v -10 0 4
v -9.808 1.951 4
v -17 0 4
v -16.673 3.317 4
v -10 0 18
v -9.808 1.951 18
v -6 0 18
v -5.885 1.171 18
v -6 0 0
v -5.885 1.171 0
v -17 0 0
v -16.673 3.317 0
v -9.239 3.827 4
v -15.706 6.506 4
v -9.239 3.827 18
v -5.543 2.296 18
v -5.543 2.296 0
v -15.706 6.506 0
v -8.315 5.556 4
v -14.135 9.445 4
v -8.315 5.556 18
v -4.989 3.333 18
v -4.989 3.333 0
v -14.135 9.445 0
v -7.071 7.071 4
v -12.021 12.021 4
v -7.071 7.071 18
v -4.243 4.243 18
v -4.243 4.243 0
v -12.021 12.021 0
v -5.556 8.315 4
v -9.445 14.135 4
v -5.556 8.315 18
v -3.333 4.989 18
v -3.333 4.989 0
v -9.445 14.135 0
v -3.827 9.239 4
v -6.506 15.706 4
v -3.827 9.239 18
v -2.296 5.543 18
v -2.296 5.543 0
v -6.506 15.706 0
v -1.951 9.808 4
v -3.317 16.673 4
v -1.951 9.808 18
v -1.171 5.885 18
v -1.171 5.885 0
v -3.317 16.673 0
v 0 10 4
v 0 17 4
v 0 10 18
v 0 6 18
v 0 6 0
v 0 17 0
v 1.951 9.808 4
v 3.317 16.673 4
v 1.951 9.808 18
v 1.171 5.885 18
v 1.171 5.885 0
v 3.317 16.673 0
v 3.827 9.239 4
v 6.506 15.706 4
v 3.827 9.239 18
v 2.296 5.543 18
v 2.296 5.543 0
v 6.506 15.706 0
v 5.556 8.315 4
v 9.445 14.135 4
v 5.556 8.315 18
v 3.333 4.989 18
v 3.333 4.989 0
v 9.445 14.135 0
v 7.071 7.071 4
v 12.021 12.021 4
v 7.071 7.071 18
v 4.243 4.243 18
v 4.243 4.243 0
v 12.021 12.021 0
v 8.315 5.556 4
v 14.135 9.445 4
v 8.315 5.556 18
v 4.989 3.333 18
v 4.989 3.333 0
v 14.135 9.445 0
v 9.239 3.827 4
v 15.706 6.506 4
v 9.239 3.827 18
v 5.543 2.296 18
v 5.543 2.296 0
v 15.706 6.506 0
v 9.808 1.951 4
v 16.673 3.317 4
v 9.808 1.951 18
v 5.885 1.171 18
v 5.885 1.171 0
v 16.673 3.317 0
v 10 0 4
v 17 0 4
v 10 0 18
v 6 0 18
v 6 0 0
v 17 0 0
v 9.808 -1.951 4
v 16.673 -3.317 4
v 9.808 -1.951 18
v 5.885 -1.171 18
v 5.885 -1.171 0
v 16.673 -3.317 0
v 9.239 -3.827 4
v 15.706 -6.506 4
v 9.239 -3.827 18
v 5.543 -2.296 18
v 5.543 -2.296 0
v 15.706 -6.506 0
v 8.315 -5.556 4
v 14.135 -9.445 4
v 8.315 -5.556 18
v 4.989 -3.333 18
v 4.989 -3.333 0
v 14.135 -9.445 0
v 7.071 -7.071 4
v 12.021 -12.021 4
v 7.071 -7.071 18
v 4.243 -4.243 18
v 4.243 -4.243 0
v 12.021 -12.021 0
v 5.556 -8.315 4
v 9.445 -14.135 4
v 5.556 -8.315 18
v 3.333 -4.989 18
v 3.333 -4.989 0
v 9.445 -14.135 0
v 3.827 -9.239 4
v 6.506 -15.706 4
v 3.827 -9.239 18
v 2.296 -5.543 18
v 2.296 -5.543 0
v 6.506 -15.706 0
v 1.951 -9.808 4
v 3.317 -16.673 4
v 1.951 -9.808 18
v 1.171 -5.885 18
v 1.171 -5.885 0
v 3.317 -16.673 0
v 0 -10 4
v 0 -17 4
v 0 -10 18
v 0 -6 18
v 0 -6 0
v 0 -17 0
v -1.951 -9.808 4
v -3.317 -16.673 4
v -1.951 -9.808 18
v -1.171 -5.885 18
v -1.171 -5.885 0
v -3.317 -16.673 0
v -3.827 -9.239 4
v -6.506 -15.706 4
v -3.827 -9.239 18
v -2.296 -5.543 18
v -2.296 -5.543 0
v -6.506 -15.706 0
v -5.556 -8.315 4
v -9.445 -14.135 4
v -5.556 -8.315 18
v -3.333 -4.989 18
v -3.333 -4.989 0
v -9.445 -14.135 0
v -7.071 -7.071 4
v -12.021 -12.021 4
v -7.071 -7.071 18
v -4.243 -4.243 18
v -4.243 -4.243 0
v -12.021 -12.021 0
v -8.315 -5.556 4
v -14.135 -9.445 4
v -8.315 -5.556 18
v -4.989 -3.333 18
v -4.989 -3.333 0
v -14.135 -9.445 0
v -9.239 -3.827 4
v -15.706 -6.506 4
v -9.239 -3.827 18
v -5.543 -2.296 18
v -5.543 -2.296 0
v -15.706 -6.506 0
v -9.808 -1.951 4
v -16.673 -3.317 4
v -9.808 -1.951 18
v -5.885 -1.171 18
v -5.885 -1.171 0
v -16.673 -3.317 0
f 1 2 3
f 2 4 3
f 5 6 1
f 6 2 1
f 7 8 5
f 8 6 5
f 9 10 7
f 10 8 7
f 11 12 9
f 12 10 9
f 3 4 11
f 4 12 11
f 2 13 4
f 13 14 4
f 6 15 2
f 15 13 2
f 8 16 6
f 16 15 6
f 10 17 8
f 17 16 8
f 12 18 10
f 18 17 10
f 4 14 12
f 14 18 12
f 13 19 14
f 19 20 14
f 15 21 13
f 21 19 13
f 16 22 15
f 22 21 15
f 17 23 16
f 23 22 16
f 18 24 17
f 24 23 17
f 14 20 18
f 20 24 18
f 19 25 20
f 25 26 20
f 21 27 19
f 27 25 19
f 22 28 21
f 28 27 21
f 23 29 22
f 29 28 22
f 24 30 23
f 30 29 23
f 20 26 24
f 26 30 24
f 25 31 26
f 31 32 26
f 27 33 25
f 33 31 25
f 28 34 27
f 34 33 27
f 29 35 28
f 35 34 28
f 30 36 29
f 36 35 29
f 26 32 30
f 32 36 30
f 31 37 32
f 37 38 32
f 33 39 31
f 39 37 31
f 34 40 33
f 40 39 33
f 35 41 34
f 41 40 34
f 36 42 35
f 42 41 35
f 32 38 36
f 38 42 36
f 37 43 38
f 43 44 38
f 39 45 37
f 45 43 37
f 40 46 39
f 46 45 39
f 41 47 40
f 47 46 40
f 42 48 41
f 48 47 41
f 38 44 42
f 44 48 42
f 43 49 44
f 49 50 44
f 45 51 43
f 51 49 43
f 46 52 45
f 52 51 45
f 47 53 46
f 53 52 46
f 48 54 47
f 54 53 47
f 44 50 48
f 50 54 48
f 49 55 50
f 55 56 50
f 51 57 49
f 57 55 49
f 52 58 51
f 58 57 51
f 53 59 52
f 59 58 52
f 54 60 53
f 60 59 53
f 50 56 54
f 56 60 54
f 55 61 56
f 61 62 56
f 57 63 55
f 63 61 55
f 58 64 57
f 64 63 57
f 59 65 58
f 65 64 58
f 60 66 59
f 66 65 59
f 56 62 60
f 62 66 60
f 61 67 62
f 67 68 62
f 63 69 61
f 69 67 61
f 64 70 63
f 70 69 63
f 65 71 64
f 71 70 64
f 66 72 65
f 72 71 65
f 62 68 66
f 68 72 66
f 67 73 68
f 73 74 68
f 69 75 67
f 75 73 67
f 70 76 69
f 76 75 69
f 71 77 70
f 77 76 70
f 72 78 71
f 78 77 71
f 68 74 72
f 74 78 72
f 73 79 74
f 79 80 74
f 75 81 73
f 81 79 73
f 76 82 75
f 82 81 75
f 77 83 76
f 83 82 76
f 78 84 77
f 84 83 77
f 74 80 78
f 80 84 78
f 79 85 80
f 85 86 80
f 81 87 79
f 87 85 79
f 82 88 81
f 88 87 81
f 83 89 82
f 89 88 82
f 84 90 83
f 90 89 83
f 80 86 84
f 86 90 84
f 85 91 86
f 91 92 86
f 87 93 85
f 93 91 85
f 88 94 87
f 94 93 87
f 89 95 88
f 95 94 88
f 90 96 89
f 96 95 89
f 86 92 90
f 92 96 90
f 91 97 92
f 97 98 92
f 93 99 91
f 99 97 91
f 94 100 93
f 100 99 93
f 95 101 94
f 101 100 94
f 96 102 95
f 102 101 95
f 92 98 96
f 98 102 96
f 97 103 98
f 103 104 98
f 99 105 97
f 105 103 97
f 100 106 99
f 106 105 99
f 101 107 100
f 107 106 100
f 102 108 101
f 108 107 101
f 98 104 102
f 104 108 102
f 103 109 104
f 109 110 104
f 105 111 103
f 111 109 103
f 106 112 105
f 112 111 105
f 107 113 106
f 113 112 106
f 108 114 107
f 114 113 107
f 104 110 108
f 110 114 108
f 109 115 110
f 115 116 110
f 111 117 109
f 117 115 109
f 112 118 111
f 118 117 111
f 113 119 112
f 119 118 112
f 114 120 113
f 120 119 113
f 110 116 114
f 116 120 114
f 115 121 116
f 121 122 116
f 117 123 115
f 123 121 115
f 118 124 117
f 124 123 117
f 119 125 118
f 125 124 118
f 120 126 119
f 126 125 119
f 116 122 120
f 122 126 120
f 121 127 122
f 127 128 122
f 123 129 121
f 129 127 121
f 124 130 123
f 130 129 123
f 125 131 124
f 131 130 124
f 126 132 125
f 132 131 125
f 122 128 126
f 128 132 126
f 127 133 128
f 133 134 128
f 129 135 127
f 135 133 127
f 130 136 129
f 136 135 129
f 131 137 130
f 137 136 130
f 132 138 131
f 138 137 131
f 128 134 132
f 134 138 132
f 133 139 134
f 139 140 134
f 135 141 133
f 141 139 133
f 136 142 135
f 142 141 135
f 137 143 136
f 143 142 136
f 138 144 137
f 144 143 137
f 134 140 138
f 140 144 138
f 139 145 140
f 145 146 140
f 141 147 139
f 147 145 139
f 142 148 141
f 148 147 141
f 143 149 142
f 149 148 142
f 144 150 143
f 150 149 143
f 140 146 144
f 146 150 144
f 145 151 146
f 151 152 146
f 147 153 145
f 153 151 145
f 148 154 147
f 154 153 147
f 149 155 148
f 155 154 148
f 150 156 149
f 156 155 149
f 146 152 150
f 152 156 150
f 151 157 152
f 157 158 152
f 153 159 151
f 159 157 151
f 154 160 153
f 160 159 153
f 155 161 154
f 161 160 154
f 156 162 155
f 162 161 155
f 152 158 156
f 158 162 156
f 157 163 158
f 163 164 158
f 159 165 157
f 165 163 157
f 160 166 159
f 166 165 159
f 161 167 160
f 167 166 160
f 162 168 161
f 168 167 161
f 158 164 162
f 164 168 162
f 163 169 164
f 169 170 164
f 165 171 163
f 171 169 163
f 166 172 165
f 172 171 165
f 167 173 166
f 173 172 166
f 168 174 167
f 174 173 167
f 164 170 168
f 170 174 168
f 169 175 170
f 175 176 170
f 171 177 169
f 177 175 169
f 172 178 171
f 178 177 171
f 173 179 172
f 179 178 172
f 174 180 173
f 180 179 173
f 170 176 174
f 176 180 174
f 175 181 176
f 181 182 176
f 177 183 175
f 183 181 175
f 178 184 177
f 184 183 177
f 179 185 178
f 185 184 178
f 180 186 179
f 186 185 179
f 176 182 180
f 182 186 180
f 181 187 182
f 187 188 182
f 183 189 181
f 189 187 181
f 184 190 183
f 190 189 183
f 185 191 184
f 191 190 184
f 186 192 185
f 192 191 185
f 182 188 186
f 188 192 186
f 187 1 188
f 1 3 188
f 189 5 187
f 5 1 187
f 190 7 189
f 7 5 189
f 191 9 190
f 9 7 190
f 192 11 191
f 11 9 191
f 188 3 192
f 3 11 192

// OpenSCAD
$fn = 32;

// ----------------------------------------------------------------------
// Arc stop: collar, 18 mm thick
// ----------------------------------------------------------------------

// --- parameters (mm) ---
revolve_angle = 360;      // full turn around the Z axis
profile_points = 6;       // points of the closed outline

profile = [[6, 0], [17, 0], [17, 4], [10, 4], [10, 18], [6, 18]];  // single closed polygon, 6 points, counter clockwise

// --- the one profile operation ---
rotate_extrude(angle = revolve_angle) polygon(points = profile);
